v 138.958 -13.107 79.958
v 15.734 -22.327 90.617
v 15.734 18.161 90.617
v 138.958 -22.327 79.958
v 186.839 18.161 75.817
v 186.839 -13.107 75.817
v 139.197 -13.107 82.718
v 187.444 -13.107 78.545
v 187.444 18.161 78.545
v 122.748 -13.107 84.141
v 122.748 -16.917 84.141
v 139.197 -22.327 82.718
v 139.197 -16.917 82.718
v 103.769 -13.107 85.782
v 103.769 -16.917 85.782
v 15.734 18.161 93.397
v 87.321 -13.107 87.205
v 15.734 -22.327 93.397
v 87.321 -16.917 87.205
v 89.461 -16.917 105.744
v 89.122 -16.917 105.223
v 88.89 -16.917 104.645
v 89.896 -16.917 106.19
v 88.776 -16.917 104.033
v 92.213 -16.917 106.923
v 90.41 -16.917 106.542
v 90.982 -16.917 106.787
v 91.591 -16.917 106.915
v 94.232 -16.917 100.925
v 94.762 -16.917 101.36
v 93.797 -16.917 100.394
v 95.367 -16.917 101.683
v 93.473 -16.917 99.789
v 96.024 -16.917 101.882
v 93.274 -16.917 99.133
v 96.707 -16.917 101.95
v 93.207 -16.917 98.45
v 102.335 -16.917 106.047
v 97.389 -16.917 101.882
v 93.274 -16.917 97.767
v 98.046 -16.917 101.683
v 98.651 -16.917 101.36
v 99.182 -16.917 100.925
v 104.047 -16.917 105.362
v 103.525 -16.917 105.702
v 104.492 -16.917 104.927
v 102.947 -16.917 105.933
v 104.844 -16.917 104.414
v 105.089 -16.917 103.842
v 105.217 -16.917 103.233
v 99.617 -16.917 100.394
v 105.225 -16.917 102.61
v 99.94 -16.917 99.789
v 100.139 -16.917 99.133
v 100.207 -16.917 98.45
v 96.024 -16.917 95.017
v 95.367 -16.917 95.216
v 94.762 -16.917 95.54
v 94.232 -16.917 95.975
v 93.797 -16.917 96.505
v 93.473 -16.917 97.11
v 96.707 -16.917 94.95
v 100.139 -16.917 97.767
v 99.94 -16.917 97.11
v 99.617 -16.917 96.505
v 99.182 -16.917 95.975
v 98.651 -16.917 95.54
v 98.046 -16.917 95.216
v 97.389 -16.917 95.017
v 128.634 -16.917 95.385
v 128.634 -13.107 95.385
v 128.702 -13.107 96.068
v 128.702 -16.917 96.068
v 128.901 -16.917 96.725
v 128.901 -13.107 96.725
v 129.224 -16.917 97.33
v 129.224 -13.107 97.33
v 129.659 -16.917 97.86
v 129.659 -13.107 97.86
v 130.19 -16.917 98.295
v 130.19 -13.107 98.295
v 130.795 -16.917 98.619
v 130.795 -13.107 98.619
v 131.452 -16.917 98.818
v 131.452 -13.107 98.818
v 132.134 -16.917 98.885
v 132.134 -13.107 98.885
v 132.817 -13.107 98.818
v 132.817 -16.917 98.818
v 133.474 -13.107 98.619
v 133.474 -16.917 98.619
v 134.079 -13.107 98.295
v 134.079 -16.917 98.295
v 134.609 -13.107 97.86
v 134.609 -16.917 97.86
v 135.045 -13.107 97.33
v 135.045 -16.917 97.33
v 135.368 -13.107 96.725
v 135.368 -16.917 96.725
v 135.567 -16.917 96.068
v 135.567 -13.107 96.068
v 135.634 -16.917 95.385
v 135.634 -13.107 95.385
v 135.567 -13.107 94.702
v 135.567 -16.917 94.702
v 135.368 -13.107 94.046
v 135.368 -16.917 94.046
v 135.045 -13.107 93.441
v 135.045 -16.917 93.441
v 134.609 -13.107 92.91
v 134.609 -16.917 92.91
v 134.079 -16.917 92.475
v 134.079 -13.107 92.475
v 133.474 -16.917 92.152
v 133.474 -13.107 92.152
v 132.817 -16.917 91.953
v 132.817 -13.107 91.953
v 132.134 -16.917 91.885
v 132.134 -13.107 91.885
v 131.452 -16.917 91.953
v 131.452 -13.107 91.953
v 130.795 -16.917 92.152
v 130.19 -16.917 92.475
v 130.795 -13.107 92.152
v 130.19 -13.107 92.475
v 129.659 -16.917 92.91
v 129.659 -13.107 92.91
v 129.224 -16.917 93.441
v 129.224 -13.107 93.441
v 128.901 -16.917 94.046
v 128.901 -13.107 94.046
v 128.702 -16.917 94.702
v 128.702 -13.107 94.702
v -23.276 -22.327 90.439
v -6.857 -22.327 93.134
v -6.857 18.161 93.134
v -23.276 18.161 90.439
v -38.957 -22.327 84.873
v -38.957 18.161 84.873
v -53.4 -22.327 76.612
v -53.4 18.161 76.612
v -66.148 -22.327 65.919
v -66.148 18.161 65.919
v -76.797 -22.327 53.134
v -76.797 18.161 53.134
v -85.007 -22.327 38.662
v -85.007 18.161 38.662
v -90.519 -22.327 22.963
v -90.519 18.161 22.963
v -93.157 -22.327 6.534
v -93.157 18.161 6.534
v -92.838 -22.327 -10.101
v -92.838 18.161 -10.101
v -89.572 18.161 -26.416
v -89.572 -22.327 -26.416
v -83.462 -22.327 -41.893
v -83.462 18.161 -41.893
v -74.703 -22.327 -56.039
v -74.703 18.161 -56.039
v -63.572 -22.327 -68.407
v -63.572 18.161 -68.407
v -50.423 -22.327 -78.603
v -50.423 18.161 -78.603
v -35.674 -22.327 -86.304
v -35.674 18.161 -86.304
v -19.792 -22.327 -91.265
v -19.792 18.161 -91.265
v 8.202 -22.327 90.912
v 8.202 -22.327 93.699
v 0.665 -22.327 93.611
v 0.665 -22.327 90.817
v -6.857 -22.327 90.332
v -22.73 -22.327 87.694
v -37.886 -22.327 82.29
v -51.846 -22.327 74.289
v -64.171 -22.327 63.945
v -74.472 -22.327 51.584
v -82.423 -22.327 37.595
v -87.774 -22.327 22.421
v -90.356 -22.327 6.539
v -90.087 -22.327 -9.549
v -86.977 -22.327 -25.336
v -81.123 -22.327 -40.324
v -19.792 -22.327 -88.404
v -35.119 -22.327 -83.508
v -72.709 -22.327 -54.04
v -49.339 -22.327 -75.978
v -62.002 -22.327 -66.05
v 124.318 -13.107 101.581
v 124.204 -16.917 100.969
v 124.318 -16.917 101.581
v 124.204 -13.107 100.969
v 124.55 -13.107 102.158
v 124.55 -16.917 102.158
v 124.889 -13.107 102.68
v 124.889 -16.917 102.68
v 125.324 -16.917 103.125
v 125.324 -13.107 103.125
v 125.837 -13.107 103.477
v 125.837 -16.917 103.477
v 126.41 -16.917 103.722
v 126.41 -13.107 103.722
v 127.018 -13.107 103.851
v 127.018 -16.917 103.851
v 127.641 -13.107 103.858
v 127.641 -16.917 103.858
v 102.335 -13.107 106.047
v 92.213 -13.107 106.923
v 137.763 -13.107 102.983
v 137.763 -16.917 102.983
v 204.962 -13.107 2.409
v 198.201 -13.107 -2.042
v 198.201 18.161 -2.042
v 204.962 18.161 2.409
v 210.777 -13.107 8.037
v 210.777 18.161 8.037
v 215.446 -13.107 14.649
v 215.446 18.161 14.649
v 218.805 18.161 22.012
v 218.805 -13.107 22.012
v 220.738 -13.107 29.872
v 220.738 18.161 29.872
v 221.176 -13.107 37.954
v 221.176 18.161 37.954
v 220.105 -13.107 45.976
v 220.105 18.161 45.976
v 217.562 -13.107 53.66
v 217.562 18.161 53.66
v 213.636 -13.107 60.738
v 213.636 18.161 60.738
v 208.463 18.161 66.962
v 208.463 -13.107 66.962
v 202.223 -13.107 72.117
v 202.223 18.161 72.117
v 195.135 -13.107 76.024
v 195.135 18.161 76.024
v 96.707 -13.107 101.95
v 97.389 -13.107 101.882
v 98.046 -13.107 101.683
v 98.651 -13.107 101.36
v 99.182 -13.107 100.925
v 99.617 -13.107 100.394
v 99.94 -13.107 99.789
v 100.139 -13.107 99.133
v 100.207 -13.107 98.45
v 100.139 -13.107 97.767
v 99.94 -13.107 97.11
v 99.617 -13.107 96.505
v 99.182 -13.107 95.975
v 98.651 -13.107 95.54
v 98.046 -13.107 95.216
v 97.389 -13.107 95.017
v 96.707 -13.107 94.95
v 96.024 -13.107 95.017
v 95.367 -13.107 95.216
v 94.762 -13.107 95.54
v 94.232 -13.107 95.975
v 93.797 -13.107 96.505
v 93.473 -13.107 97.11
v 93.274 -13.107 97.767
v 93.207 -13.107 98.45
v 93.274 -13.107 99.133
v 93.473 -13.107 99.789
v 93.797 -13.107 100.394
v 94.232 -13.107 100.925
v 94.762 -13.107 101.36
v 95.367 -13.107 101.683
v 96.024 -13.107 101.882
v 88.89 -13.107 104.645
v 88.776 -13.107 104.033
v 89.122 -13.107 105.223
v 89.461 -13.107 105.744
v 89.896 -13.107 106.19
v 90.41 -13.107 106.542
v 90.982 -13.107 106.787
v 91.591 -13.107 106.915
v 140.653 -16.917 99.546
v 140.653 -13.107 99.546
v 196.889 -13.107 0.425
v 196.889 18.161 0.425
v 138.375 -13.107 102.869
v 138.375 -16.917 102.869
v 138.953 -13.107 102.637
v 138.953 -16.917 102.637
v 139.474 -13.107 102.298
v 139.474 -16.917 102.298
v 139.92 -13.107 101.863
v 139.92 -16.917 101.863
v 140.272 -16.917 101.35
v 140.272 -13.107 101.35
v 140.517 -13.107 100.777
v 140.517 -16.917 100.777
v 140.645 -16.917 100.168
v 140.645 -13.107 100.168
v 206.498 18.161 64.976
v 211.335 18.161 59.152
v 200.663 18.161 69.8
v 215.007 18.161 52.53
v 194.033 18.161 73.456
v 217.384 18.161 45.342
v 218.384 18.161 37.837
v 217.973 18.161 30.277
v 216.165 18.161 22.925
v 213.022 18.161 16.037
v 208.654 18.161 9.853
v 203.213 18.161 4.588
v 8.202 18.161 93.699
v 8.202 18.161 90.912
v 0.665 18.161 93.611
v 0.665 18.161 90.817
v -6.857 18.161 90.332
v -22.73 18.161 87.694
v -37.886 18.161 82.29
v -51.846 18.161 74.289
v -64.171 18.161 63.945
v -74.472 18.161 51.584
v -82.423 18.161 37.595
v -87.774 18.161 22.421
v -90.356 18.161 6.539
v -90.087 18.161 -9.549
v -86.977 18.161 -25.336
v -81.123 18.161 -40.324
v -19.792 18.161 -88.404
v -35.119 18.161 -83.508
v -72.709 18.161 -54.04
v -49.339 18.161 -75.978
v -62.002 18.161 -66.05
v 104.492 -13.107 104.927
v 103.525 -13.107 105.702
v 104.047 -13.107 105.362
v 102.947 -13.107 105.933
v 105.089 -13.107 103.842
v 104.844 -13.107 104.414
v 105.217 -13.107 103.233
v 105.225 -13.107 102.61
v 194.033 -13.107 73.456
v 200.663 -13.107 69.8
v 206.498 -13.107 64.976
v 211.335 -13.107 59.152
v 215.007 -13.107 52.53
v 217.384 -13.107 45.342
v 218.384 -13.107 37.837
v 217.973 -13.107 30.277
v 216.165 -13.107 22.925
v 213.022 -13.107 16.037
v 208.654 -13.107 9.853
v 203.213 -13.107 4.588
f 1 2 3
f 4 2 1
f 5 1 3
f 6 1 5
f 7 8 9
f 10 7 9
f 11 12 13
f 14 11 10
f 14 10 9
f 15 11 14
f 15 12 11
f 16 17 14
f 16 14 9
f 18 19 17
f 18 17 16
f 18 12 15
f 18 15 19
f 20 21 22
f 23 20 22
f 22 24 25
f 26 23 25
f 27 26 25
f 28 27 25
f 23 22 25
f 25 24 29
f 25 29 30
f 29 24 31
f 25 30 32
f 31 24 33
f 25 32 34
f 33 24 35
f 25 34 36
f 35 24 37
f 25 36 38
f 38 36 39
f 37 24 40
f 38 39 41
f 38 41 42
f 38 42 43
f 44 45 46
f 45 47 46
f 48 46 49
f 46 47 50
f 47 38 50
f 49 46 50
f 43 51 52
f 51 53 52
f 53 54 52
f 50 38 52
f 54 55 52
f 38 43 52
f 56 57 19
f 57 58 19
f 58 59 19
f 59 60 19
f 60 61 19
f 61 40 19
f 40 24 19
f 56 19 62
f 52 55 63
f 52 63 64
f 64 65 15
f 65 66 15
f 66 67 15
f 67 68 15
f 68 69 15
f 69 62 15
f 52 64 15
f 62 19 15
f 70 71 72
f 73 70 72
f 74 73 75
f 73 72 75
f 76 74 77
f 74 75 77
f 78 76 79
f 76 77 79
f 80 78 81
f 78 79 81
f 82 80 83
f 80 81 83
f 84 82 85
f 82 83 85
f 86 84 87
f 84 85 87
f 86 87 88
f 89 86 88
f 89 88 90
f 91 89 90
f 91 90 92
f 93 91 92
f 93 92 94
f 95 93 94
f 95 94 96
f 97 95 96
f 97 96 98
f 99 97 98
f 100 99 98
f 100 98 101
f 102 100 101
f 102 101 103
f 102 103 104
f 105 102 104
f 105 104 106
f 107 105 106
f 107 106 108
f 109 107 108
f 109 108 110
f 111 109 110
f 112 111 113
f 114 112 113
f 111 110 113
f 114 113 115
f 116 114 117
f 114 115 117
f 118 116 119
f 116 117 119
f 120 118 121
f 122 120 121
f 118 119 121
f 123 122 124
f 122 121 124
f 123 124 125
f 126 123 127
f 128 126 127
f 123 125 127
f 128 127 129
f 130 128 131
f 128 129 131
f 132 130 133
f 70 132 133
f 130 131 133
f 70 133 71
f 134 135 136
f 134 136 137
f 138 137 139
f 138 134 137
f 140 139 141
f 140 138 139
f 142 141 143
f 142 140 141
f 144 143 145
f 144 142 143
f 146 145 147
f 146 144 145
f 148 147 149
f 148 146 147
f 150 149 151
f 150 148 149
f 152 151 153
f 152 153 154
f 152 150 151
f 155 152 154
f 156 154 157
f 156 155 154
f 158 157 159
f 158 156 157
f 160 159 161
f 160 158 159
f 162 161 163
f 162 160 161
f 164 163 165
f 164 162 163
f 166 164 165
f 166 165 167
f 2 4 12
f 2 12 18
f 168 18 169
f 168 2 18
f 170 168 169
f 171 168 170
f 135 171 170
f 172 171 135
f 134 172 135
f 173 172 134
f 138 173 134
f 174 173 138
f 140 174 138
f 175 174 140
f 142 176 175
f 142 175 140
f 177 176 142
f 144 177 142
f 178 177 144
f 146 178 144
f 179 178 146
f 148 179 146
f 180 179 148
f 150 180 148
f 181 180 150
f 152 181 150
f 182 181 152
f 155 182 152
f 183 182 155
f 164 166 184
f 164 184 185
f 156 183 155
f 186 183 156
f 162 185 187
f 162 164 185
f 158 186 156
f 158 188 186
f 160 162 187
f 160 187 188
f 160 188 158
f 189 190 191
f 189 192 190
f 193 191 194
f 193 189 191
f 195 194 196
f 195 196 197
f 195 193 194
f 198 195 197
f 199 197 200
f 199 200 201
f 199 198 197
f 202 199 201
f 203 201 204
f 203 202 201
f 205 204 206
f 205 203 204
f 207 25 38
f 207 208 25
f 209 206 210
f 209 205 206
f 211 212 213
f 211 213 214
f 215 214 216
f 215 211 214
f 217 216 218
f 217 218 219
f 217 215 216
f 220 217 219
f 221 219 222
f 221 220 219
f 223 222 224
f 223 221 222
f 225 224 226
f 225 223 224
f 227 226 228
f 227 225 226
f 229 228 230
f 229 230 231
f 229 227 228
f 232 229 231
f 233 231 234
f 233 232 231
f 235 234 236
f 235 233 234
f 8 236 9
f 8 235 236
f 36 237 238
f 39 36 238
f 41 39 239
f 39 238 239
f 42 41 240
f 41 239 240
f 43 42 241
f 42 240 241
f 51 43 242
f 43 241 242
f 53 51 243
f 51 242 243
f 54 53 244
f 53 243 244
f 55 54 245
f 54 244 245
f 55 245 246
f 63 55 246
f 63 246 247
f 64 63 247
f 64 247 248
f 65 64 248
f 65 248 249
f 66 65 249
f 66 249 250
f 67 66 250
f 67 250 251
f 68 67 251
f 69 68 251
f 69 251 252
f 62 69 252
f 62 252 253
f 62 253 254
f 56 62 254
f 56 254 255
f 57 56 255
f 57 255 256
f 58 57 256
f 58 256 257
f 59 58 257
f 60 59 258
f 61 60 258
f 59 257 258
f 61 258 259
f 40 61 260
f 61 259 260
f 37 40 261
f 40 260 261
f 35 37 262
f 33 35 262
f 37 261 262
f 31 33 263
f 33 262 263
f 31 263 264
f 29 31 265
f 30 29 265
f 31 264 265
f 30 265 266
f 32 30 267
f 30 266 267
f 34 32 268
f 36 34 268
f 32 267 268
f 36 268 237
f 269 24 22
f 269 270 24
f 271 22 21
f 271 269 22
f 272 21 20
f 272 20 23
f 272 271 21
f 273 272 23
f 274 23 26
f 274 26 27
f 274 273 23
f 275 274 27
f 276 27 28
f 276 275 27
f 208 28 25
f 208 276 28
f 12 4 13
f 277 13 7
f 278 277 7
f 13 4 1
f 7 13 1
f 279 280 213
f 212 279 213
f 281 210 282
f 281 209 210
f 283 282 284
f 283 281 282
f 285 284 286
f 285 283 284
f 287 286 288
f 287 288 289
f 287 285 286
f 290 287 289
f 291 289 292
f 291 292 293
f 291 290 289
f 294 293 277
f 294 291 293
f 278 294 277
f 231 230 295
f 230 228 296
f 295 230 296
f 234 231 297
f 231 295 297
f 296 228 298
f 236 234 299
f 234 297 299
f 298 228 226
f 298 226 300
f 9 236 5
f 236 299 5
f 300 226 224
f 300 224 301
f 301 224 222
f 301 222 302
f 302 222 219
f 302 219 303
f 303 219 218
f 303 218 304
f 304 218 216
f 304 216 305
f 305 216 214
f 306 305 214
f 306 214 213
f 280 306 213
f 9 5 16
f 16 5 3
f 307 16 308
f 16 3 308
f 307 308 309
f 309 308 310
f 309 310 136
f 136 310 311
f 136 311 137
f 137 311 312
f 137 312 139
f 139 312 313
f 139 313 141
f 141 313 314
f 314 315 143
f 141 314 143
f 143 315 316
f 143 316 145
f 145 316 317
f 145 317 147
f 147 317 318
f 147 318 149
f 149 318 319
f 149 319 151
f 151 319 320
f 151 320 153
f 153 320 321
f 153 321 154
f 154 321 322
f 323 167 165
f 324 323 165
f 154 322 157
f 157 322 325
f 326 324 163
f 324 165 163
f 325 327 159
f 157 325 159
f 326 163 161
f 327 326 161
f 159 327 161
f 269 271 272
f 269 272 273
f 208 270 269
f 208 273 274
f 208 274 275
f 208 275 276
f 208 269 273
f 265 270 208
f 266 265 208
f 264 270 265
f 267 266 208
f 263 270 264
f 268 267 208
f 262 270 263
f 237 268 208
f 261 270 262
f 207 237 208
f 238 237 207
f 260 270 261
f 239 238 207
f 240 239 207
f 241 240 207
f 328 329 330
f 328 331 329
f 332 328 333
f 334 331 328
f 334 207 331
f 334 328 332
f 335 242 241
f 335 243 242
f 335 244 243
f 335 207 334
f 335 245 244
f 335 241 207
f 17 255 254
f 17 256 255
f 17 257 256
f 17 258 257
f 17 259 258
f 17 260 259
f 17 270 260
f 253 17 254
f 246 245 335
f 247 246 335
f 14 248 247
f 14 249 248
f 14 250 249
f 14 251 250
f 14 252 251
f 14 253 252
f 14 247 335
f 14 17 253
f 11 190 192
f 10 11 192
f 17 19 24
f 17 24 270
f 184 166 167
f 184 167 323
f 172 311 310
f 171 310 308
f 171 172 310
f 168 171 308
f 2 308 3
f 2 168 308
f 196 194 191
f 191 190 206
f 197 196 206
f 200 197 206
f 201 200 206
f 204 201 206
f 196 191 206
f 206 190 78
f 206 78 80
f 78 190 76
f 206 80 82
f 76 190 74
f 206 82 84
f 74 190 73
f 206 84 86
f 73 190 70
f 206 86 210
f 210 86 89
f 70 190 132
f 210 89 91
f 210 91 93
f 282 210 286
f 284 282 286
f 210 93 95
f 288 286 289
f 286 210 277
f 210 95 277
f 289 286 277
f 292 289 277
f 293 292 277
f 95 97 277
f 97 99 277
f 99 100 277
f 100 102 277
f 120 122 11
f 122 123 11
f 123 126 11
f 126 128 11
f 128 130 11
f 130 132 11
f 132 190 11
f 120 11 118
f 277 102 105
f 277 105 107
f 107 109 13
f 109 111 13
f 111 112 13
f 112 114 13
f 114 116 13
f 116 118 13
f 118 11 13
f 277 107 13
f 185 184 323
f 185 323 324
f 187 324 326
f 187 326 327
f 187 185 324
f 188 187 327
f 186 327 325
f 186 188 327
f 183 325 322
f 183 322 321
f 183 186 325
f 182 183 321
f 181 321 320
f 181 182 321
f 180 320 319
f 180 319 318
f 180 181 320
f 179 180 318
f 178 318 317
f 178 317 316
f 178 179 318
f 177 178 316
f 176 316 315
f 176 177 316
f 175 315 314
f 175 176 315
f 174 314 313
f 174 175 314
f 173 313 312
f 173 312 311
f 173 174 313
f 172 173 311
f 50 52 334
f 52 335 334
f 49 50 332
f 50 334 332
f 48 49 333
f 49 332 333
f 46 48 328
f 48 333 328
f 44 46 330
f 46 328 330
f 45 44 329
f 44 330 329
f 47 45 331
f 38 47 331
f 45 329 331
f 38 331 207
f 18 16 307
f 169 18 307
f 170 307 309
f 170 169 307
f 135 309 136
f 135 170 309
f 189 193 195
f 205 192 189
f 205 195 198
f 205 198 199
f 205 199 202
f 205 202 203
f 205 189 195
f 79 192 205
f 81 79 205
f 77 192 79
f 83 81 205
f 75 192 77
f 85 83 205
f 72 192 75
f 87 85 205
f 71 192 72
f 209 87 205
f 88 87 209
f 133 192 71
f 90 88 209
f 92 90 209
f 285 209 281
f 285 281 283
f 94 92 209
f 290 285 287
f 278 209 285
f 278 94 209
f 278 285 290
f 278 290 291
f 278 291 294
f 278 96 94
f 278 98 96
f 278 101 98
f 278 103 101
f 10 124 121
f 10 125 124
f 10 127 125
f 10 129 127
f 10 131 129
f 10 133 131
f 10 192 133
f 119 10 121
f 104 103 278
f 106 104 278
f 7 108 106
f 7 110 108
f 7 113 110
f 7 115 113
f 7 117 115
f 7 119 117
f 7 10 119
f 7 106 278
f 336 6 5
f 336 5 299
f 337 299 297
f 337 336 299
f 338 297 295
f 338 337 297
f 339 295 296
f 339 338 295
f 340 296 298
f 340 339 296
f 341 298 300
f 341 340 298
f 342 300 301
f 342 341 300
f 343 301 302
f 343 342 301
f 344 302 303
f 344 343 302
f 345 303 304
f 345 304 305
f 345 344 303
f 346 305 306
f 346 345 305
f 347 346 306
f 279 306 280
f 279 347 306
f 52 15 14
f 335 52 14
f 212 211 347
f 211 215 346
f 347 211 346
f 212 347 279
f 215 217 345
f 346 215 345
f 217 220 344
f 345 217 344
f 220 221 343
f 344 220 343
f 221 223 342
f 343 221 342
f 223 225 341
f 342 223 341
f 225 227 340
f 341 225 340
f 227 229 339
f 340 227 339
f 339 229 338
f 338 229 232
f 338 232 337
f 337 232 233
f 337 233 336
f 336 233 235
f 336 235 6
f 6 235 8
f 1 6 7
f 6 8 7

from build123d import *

# Parameters (mm, degrees)
BOSS_EXTRUDE1_DEPTH      = 18.161
BOSS_EXTRUDE1_DEPTH_BACK = 22.3266
SKETCH2_W                = 50.8
SKETCH2_H                = 9.2198
CUT_EXTRUDE1_DEPTH       = 284.270468487
SKETCH3_W                = 16.51
SKETCH3_H                = 3.81
BOSS_EXTRUDE2_DEPTH      = 20.066
FILLET1_R                = 3.175
SKETCH6_R                = 3.5
CUT_EXTRUDE2_DEPTH       = 247.712568685


with BuildPart() as part:
    # Sketch1 → Boss-Extrude1 (new, two sides: drawn at the far end of the back side and taken through both)
    with BuildSketch(Plane(origin=(0, 0, 0), x_dir=(1, 0, 0), z_dir=(0, 1, 0)).offset(-BOSS_EXTRUDE1_DEPTH_BACK)):
        with BuildLine():
            Line((196.889409017, -0.425348601), (198.20116227, 2.041580543))
            ThreePointArc((198.20116227, 2.041580543), (220.828085525, -41.989964588), (187.443785094, -78.544623763))
            Line((187.443785094, -78.544623763), (15.733893811, -93.397170278))
            ThreePointArc((15.733893811, -93.397170278), (4.433186875, -93.703720252), (-6.857314776, -93.134051394))
            ThreePointArc((-6.857314776, -93.134051394), (-93.157259302, -6.53447277), (-19.791883622, 91.264755726))
            Line((-19.791883622, 91.264755726), (-19.791883622, 88.403734249))
            ThreePointArc((-19.791883622, 88.403734249), (-90.355870432, -6.538773964), (-6.857314776, -90.332254043))
            ThreePointArc((-6.857314776, -90.332254043), (4.432766695, -90.912759675), (15.733893811, -90.617036256))
            Line((15.733893811, -90.617036256), (186.839155599, -75.816788928))
            ThreePointArc((186.839155599, -75.816788928), (218.059607792, -41.613105239), (196.889409017, -0.425348601))
        make_face()
    extrude(amount=BOSS_EXTRUDE1_DEPTH + BOSS_EXTRUDE1_DEPTH_BACK)

    # Sketch2 → Cut-Extrude1 (cut, through all)
    with BuildSketch(Plane(origin=(8.135510173, 0, 94.054414573), x_dir=(0.9962799178494617, 0, -0.08617612946674955), z_dir=(0.08617612946674955, 0, 0.9962799178494617))):
        Polygon((131.550880619, -13.1068), (131.550880619, -22.3266), (179.977807149, -22.3266), (179.977807149, -13.1068), (133.582880619, -13.1068), align=None)
        with Locations((205.377807149, -17.7167)):
            Rectangle(SKETCH2_W, SKETCH2_H)
    extrude(amount=-CUT_EXTRUDE1_DEPTH, mode=Mode.SUBTRACT)

    # Sketch3 → Boss-Extrude2 (add)
    with BuildSketch(Plane(origin=(8.135510173, 0, 94.054414573), x_dir=(0.9962799178494617, 0, -0.08617612946674955), z_dir=(0.08617612946674955, 0, 0.9962799178494617))):
        with Locations((123.295880619, -15.0118)):
            Rectangle(SKETCH3_W, SKETCH3_H)
        with Locations((87.735880619, -15.0118)):
            Rectangle(SKETCH3_W, SKETCH3_H)
    extrude(amount=BOSS_EXTRUDE2_DEPTH)

    # Fillet1
    fillet1_edges = [part.edges().sort_by_distance(p)[0] for p in [
        (140.926220923, -15.0118, 102.709221685),
        (124.47763948, -15.0118, 104.131989583),
        (105.498507044, -15.0118, 105.773644849),
        (89.049925601, -15.0118, 107.196412746),
    ]]
    fillet(fillet1_edges, radius=FILLET1_R)

    # Sketch6 → Cut-Extrude2 (cut, through all)
    with BuildSketch(Plane(origin=(0, 0, 0), x_dir=(1, 0, 0), z_dir=(0, 1, 0))):
        with Locations(Location((96.706652463, -98.449712297, 0), (0, 0, 270))):
            Circle(SKETCH6_R)
        with Locations(Location((132.134366342, -95.385289133, 0), (0, 0, 180))):
            Circle(SKETCH6_R)
    extrude(amount=-CUT_EXTRUDE2_DEPTH, mode=Mode.SUBTRACT)


solid = part.part
